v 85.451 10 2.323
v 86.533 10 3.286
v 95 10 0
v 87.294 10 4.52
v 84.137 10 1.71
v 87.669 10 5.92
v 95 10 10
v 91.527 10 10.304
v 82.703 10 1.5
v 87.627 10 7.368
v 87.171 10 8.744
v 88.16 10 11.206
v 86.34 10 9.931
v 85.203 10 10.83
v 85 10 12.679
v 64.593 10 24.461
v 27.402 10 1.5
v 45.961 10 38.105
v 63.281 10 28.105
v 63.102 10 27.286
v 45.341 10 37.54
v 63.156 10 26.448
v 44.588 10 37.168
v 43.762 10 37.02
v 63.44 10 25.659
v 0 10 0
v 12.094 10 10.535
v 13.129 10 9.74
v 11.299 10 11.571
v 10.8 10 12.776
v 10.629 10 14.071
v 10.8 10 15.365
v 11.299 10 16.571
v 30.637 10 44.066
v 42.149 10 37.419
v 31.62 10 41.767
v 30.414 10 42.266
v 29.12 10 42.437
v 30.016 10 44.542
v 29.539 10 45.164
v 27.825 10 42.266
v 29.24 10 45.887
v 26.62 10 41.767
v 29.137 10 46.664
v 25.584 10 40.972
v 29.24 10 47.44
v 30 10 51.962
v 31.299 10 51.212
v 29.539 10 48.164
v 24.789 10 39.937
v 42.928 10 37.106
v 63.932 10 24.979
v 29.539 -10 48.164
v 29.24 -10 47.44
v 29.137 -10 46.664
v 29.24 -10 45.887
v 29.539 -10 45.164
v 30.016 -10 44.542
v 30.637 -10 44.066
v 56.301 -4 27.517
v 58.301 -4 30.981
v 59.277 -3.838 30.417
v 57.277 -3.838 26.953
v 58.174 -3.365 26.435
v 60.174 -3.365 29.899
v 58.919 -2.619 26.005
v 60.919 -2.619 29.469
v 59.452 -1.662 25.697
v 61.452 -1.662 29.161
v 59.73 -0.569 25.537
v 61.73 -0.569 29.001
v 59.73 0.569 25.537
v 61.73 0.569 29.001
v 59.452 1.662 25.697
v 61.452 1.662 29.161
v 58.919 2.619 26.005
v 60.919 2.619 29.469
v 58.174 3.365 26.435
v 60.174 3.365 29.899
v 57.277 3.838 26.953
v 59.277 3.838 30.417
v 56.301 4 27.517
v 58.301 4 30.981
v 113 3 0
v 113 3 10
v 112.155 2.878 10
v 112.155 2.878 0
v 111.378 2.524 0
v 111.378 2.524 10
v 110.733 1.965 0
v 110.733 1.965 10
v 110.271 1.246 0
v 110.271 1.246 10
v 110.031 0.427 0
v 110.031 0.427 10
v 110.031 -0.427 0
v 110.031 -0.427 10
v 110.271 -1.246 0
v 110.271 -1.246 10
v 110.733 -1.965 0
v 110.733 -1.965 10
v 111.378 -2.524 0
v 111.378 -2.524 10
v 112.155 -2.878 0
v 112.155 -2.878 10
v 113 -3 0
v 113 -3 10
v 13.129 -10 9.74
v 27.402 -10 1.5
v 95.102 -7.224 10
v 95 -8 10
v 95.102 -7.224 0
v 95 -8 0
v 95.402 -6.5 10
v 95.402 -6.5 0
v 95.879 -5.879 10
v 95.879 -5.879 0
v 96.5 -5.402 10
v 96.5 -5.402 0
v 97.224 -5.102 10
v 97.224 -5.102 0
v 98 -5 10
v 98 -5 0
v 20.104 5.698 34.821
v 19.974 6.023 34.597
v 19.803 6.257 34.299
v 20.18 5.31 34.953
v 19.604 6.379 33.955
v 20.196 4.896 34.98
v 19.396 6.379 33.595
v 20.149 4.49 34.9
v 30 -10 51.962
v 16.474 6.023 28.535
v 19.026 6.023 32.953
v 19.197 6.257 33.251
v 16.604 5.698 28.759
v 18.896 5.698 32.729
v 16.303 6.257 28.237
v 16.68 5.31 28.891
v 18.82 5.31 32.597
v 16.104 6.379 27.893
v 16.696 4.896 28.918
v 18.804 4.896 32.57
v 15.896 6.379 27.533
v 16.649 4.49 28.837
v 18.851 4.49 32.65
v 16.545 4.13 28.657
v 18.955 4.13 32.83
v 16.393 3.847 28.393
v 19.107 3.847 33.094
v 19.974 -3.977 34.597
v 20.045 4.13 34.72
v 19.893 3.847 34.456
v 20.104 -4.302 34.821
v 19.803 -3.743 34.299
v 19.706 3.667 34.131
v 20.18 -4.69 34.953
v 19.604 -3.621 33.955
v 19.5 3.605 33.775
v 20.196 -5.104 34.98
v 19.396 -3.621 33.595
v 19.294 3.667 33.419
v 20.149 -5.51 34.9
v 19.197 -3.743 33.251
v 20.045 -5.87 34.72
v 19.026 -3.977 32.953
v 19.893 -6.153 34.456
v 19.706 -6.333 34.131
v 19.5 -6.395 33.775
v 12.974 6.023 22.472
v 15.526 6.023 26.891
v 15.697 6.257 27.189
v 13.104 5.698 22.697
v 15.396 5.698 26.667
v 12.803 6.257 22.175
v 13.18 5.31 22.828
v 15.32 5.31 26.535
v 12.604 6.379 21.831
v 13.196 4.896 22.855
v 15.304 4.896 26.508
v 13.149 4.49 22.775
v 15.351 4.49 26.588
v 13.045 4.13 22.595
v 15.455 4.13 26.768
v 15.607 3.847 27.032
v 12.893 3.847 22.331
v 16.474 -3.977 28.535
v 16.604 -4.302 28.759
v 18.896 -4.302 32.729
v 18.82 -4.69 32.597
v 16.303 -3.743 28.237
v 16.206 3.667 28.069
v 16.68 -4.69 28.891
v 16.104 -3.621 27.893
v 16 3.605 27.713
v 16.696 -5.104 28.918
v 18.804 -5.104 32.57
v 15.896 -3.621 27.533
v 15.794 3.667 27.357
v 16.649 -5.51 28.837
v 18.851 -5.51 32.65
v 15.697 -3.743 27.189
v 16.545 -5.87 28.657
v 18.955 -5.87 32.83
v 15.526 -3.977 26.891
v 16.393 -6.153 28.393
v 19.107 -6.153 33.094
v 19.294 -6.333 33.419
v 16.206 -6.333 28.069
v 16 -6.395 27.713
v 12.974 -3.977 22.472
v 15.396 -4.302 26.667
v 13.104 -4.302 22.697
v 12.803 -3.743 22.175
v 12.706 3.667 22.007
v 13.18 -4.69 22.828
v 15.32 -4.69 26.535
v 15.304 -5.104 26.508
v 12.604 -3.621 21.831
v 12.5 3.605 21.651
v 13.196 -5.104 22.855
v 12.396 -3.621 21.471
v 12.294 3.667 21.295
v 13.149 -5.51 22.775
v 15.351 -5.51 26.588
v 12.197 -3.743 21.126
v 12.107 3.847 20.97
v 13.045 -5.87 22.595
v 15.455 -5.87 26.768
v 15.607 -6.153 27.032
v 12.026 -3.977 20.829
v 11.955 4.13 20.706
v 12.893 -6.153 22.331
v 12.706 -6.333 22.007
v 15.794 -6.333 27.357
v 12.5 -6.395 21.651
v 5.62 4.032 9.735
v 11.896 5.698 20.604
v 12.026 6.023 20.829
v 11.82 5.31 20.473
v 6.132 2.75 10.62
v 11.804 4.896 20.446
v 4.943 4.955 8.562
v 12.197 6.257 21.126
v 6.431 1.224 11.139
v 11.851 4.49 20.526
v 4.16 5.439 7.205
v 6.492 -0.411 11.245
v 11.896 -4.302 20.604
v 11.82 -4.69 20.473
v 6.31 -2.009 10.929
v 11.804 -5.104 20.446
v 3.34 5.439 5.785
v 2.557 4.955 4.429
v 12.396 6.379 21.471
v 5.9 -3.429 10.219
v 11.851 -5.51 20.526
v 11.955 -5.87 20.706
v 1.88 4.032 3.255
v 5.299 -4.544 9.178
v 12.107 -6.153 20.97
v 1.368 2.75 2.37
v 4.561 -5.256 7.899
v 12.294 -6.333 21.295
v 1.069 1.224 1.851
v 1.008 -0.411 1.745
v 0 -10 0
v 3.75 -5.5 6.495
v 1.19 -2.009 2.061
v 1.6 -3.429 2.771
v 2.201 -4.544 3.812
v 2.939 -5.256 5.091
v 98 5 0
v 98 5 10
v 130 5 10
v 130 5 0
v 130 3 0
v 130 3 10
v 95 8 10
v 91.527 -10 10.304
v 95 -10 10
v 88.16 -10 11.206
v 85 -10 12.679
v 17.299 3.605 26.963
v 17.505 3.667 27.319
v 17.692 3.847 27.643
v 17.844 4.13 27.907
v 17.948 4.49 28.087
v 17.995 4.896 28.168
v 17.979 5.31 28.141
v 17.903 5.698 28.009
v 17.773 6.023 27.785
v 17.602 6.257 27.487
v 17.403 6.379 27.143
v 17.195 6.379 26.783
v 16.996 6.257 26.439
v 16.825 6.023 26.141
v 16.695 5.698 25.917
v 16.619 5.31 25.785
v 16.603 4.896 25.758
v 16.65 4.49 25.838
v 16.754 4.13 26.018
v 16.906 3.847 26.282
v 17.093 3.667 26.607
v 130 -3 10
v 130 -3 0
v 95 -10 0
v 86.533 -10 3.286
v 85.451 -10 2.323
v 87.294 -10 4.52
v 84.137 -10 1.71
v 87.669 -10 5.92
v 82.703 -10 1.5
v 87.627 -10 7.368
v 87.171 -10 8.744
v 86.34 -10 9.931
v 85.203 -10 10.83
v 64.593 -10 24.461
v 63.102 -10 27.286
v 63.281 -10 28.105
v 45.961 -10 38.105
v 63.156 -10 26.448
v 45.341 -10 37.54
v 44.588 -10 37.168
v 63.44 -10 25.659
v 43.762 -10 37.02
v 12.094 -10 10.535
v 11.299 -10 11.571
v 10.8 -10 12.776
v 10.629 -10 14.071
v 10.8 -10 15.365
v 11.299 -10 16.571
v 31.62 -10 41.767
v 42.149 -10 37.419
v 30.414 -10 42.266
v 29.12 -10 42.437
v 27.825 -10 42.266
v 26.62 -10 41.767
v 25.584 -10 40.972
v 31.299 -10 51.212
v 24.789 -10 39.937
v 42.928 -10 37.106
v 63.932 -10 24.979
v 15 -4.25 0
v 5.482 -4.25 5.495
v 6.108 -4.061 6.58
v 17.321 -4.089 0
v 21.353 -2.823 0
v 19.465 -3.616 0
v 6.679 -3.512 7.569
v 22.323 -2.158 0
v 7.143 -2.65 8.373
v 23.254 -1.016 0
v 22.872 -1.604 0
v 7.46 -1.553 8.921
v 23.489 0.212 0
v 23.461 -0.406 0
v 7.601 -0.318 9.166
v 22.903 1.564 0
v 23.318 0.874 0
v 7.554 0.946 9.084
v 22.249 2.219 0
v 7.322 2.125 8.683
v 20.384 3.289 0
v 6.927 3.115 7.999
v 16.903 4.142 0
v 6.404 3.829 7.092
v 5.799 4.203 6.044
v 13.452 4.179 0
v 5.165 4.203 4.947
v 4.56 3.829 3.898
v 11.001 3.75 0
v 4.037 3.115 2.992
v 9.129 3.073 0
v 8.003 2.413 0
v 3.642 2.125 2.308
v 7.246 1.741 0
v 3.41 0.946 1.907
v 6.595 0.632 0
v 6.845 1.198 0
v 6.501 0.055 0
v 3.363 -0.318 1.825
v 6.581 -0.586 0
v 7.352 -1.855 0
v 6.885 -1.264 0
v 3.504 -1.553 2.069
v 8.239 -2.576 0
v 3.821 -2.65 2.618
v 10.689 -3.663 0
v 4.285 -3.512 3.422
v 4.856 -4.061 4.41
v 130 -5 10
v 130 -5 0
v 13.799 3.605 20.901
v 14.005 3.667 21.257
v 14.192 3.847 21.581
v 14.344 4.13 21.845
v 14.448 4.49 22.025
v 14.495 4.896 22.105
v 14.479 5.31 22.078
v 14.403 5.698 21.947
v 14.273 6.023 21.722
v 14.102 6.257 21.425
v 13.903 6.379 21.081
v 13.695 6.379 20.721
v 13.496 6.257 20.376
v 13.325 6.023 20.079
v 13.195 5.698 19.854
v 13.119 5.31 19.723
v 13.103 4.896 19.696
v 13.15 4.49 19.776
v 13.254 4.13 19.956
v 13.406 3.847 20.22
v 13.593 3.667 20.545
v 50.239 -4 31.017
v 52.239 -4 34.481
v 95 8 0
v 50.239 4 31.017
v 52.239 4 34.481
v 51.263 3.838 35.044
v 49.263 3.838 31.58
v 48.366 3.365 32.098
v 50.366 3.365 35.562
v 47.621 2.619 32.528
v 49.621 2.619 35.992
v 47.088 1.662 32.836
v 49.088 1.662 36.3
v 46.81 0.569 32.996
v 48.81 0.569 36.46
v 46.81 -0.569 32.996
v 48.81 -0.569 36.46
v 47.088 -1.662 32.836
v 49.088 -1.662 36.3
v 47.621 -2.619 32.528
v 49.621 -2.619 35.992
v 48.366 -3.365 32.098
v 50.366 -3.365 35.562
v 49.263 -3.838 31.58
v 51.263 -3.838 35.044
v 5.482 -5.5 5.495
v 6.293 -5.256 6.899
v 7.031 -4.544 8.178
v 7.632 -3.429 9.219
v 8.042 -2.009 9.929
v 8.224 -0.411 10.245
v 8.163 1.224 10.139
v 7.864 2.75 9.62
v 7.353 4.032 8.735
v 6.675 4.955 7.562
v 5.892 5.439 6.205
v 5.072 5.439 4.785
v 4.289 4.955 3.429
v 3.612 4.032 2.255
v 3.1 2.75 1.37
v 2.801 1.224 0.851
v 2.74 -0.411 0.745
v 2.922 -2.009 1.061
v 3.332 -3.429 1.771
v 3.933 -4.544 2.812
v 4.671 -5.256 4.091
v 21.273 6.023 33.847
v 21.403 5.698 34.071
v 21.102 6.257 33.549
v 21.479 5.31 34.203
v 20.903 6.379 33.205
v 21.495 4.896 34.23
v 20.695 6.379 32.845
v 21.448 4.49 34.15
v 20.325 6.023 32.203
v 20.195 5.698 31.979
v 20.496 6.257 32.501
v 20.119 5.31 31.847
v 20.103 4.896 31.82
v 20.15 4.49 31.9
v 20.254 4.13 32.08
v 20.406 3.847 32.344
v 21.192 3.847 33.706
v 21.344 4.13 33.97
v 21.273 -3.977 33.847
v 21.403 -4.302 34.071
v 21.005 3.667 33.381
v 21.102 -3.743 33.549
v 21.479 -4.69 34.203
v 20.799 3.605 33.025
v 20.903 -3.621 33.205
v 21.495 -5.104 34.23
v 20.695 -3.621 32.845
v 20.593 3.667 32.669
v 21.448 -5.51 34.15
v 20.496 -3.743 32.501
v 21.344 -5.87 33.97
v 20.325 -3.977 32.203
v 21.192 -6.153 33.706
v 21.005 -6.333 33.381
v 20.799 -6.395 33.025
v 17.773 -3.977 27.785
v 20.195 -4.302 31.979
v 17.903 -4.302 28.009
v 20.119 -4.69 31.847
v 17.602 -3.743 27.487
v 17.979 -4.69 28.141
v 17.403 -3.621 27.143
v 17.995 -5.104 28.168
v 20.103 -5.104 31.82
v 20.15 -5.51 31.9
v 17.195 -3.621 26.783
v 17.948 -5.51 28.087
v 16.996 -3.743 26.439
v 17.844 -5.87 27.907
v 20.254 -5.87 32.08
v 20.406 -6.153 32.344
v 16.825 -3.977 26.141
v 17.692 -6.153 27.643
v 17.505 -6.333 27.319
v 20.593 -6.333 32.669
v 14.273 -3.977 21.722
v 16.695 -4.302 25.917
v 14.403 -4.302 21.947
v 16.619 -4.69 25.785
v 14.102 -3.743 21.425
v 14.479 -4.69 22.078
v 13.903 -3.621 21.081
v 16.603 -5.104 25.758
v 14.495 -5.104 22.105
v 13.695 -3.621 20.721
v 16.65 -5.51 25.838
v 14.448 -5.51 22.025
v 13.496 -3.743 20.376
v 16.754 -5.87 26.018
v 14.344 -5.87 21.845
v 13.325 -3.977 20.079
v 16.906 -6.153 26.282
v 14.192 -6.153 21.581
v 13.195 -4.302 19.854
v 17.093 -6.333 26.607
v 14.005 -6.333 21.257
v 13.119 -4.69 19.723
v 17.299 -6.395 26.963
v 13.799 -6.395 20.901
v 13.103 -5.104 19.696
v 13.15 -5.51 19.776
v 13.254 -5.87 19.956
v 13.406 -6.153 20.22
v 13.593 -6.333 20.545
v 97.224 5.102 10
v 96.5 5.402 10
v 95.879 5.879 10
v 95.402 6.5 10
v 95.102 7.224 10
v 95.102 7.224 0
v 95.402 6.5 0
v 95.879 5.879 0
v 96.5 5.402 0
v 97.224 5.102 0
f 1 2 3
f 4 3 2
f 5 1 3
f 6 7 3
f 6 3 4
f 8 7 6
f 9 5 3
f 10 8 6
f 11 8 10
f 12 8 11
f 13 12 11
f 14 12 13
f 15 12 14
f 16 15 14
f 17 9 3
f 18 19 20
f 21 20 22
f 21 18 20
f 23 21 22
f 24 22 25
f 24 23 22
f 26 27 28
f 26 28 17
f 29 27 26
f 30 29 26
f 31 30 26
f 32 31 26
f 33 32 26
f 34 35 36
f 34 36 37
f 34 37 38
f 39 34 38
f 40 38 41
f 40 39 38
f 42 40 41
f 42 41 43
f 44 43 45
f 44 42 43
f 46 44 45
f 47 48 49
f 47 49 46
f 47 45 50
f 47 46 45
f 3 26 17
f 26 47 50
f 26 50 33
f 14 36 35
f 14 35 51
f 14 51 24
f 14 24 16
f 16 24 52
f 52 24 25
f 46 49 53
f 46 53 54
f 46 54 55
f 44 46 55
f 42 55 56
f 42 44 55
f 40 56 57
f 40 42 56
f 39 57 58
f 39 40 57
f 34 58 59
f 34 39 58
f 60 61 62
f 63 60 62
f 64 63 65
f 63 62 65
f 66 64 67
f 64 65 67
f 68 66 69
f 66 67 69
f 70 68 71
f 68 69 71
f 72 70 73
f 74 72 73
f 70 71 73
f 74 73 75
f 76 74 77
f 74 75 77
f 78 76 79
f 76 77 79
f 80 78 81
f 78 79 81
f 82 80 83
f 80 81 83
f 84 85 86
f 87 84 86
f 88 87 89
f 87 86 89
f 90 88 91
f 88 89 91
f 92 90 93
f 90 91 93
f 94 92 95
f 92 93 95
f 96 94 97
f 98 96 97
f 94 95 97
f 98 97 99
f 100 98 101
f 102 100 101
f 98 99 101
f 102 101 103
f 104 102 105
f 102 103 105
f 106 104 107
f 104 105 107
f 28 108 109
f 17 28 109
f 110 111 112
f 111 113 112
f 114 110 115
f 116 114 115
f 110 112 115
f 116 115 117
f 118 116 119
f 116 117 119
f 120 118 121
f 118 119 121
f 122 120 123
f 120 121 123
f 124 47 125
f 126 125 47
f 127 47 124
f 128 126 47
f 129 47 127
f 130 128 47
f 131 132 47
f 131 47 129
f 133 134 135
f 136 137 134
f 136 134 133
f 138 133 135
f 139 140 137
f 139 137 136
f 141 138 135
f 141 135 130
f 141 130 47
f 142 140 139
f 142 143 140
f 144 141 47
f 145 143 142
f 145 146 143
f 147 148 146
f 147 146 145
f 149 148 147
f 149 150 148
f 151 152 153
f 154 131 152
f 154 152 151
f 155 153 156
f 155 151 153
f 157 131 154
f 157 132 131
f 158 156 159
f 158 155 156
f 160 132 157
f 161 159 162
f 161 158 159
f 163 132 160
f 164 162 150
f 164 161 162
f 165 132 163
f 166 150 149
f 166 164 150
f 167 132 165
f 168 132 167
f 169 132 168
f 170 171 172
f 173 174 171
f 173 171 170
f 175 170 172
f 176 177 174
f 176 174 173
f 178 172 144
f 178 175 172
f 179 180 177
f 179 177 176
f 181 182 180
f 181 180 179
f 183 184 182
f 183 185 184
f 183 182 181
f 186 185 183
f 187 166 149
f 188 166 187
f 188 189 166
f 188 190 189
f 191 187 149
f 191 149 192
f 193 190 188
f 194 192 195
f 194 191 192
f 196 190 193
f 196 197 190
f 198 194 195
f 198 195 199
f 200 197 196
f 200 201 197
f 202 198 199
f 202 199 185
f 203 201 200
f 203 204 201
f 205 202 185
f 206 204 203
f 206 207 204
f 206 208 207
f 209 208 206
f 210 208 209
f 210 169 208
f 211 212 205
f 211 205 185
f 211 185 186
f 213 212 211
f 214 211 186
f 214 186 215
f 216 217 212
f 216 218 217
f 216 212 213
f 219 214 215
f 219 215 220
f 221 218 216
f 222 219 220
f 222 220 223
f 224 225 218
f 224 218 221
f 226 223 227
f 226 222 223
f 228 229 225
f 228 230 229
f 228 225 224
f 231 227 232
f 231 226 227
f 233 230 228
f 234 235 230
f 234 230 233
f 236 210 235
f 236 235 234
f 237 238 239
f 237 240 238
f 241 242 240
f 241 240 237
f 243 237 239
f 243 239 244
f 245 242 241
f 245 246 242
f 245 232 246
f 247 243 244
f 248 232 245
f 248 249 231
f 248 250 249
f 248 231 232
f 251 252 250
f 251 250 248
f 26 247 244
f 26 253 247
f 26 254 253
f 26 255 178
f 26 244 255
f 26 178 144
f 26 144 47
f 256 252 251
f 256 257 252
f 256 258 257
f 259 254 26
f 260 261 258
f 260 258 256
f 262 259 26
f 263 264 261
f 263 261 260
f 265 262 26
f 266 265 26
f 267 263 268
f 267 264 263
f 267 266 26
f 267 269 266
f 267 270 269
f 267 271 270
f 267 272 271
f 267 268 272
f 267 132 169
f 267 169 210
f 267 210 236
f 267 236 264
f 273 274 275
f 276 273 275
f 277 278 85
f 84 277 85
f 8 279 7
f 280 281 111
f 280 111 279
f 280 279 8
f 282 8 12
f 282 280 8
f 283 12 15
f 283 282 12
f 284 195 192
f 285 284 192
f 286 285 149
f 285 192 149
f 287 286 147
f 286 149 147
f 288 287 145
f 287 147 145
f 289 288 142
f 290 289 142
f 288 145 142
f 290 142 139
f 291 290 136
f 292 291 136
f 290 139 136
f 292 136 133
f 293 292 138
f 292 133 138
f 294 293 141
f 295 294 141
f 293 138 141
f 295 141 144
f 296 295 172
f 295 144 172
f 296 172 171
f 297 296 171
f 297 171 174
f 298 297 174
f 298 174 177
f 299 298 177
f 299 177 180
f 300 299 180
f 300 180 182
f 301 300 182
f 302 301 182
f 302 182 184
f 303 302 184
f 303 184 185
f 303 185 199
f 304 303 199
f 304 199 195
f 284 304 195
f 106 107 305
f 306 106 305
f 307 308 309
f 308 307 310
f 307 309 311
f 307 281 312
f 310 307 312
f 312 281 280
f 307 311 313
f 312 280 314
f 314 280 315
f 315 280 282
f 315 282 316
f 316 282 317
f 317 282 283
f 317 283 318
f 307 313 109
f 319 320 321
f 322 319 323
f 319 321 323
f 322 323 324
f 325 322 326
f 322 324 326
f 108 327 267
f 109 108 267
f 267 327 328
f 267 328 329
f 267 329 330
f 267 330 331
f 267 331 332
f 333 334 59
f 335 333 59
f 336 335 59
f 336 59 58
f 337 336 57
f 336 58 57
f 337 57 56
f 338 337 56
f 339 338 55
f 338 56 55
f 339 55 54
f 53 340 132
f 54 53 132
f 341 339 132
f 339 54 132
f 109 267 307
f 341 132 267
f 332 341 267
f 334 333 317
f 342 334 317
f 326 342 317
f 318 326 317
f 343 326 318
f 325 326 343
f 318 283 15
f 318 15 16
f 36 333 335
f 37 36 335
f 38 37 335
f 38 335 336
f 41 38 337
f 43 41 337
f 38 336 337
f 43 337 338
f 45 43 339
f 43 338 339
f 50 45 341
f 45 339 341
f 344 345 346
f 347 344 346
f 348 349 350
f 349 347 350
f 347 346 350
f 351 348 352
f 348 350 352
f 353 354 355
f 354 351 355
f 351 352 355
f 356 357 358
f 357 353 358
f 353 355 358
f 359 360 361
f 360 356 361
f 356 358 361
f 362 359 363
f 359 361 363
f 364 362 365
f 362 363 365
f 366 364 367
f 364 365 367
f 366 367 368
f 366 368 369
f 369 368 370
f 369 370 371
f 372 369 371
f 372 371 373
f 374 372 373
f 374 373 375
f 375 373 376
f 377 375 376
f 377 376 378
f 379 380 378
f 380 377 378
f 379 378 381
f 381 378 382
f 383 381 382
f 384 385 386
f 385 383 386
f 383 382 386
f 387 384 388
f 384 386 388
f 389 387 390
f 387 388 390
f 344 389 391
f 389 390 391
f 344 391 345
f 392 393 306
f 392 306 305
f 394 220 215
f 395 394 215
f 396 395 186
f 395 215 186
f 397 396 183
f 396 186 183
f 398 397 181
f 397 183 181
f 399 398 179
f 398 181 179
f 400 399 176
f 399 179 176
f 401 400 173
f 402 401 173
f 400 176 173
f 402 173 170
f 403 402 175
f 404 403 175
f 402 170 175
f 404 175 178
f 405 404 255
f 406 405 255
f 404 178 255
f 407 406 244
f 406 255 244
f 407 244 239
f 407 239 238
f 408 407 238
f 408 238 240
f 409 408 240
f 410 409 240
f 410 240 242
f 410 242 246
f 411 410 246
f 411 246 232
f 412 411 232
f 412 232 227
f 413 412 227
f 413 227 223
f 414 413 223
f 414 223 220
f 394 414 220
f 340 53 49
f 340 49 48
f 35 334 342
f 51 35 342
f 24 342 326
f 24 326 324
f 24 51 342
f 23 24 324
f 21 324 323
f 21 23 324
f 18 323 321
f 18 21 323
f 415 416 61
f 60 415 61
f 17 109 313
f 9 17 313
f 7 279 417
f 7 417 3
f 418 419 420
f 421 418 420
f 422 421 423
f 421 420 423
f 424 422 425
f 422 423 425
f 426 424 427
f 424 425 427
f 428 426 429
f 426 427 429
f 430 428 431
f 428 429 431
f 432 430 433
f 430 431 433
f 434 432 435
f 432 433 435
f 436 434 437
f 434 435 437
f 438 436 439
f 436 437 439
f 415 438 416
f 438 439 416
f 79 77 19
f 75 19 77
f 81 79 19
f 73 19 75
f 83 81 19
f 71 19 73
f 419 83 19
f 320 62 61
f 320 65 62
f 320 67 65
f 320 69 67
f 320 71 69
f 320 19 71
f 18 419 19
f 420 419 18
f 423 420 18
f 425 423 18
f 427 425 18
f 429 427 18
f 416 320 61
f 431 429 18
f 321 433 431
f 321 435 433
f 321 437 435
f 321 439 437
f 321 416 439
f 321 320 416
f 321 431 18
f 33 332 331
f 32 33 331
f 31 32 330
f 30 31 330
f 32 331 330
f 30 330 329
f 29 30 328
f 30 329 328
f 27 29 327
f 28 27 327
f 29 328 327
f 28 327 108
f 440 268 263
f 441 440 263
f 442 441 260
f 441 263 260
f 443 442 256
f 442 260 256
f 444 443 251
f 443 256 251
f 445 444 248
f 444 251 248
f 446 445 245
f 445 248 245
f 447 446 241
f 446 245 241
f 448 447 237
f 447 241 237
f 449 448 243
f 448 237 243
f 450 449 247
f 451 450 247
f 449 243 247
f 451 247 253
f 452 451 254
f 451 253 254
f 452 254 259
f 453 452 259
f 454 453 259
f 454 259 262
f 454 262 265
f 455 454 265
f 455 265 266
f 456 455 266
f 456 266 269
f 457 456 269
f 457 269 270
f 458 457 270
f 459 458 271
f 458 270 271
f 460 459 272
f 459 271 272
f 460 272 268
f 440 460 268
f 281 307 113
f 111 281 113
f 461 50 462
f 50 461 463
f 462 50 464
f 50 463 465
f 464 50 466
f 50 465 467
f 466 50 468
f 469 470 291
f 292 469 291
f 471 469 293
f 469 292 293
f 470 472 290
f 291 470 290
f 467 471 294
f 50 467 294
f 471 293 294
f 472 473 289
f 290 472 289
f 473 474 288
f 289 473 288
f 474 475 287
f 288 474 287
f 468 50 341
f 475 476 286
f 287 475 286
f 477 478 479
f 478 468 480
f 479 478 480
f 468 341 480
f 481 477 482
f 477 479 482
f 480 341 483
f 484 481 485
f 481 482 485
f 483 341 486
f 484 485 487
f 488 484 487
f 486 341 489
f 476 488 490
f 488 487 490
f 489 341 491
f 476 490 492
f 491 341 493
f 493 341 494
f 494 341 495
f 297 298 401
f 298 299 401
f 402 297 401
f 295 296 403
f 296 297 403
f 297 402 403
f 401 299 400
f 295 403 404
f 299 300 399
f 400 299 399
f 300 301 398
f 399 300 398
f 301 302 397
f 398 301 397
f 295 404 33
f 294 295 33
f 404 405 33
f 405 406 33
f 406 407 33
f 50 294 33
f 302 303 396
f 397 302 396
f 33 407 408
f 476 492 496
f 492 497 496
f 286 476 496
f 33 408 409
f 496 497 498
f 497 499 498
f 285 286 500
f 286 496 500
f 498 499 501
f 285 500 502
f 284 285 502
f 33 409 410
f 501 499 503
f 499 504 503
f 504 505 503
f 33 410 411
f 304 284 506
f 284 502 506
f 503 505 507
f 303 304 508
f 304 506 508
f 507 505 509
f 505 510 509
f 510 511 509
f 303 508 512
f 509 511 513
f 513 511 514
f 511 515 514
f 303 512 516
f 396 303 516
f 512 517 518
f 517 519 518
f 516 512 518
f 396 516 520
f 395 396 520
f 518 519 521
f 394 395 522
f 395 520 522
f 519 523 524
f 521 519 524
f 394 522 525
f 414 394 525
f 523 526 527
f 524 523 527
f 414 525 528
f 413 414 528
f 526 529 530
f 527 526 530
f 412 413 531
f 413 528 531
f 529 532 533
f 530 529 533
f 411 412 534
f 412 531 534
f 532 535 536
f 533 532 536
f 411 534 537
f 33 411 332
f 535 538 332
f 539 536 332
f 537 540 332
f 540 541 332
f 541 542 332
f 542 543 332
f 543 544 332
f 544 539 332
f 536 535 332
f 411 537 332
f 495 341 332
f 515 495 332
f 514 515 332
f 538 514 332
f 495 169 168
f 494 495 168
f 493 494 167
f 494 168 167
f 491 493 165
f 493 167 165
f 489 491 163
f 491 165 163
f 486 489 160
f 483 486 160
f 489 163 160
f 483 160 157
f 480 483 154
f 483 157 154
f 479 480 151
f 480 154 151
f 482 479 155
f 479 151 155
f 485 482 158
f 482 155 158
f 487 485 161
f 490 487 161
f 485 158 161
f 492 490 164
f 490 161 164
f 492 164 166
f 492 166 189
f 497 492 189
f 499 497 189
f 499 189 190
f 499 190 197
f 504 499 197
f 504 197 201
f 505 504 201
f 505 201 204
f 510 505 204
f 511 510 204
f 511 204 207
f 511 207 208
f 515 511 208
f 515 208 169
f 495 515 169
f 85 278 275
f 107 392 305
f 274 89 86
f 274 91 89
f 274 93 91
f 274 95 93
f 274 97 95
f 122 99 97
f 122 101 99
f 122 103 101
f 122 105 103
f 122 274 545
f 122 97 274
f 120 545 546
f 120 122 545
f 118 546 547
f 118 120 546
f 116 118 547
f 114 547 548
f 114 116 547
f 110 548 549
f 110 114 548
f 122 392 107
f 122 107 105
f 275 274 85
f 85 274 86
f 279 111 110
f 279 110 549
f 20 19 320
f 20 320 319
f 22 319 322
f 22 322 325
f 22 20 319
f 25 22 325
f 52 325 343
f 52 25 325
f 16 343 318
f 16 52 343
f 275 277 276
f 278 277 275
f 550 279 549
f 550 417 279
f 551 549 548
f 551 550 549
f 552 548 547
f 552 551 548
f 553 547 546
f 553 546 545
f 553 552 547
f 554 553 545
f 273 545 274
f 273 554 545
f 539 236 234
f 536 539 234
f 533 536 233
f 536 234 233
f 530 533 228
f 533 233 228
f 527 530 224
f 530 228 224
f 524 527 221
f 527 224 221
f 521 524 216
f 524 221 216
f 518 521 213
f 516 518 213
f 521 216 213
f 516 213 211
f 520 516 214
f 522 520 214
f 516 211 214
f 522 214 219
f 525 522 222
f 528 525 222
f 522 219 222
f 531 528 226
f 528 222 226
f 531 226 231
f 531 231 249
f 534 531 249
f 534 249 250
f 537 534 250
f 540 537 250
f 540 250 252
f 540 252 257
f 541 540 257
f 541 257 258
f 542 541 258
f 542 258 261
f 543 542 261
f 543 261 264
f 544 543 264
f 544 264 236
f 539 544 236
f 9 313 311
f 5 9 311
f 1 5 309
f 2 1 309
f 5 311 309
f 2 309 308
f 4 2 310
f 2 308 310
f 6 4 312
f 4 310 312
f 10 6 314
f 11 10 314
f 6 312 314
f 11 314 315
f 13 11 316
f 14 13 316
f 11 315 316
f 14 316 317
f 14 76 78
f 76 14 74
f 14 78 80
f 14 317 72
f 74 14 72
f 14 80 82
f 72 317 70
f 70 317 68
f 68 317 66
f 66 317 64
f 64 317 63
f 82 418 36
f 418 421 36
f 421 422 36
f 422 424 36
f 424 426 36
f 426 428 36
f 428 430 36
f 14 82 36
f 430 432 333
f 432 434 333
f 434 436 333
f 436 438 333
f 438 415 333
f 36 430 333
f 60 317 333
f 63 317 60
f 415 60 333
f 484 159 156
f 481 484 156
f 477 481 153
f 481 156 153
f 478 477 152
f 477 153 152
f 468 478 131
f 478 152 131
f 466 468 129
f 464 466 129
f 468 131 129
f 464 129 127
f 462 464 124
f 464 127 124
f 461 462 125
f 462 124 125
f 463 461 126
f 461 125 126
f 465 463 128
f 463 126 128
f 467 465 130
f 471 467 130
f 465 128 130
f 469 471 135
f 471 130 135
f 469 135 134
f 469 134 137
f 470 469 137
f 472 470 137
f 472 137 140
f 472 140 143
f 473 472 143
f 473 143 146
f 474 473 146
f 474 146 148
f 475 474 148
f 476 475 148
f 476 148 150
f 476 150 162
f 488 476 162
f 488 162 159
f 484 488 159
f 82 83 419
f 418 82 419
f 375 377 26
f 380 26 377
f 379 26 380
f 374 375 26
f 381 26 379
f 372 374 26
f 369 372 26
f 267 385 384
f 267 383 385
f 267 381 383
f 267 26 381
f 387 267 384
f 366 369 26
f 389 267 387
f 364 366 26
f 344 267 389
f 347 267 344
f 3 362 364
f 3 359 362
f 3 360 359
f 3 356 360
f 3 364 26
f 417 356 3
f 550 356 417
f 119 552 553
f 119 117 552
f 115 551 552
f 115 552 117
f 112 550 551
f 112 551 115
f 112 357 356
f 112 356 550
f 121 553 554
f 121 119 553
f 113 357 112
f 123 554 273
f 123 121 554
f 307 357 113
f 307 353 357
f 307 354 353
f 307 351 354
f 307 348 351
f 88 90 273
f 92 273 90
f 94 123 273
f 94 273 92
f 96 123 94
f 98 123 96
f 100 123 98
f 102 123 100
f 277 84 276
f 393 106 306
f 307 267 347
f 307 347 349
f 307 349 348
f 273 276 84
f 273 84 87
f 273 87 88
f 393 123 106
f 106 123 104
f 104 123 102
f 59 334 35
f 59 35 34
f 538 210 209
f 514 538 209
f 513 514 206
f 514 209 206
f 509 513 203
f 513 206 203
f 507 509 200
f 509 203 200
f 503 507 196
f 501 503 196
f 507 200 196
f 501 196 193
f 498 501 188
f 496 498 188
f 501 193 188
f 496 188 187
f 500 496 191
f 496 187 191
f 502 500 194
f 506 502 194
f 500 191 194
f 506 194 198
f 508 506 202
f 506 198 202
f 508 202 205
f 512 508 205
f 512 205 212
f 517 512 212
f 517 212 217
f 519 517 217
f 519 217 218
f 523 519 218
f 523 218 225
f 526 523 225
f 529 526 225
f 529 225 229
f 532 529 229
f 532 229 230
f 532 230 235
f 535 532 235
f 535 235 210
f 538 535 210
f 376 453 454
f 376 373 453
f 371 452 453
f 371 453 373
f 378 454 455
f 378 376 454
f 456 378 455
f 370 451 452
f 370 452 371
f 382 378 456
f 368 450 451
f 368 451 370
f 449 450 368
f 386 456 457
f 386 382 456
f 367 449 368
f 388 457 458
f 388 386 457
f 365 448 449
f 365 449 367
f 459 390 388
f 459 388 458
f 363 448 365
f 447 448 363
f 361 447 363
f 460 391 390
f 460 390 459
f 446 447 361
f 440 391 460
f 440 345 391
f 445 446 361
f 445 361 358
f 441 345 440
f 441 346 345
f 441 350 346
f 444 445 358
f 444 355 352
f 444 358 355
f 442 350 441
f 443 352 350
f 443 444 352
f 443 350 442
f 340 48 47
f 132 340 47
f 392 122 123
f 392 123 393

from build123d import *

# Parameters (mm, degrees)
F1_DEPTH    = 10
F2_T1_DEPTH = 20
F4_DEPTH    = 20.001
F5_W        = 35
F5_H        = 5
F6_DEPTH    = 10.001
F7_R        = 3
F9_DEPTH    = 10.001
F11_DEPTH   = 4
F12_R       = 5.5
F13_DEPTH   = 2
F14_R       = 4.25
F15_DEPTH   = 112.584302492
F16_R       = 1.395
F17_DEPTH   = 25


# Not quite as in the source:
# - a fillet or chamfer that OpenCascade refuses, or shapes differently, is made with other operations: its cross-section is extruded or revolved along the edge and cut away or added


with BuildPart() as f1:
    # F0 (on Front) → F1 (new body, symmetric)
    with BuildSketch(Plane.XZ):
        with BuildLine():
            Line((30, 51.9615242271), (0, 0))
            Line((0, 0), (130, 0))
            Line((130, 0), (130, 10))
            Line((130, 10), (95, 10))
            ThreePointArc((95, 10), (89.8236190979, 10.6814834742), (85, 12.6794919243))
            Line((85, 12.6794919243), (62.0314784198, 25.9403740415))
            Line((62.0314784198, 25.9403740415), (63.2814784198, 28.105437551))
            Line((63.2814784198, 28.105437551), (45.9609703441, 38.105437551))
            Line((45.9609703441, 38.105437551), (44.7109703441, 35.9403740415))
            Line((44.7109703441, 35.9403740415), (28.0394191624, 45.5656986041))
            Line((28.0394191624, 45.5656986041), (31.2990381057, 51.2115242271))
            Line((31.2990381057, 51.2115242271), (30, 51.9615242271))
        make_face()
    extrude(amount=F1_DEPTH, both=True)

    # F2: fillet of radius 3 on 3 edges, made by hand

    # F2_s2 → F2_t1 (join)
    with BuildSketch(Plane.XZ.offset(-10)):
        with BuildLine():
            ThreePointArc((63.2814784198, 28.105437551), (63.2705212044, 26.0433626604), (64.5932161113, 24.4613540958))
            Line((64.5932161113, 24.4613540958), (62.0314784198, 25.9403740415))
            Line((62.0314784198, 25.9403740415), (63.2814784198, 28.105437551))
        make_face()
        with BuildLine():
            ThreePointArc((42.1492326526, 37.4193939873), (44.180639712, 37.0649108788), (45.9609703441, 38.105437551))
            Line((45.9609703441, 38.105437551), (44.7109703441, 35.9403740415))
            Line((44.7109703441, 35.9403740415), (42.1492326526, 37.4193939873))
        make_face()
        with BuildLine():
            ThreePointArc((29.5394191624, 48.1637748154), (29.2397178949, 45.8873176801), (30.6374953738, 44.0656986041))
            Line((30.6374953738, 44.0656986041), (28.0394191624, 45.5656986041))
            Line((28.0394191624, 45.5656986041), (29.5394191624, 48.1637748154))
        make_face()
    extrude(amount=F2_T1_DEPTH)

    # F3 (on face) → F4 (cut, through all)
    with BuildSketch(Plane.XZ.offset(10)):
        with BuildLine():
            ThreePointArc((82.7031939779, 1.5), (87.5328231093, 5.2059047745), (85.2031939779, 10.8301270189))
            Line((85.2031939779, 10.8301270189), (31.6195461814, 41.7666604984))
            ThreePointArc((31.6195461814, 41.7666604984), (27.8254509559, 42.2661626109), (24.7894191624, 39.9365334795))
            Line((24.7894191624, 39.9365334795), (11.2990381057, 16.5705080757))
            ThreePointArc((11.2990381057, 16.5705080757), (10.7995359932, 12.7764128502), (13.1291651246, 9.7403810568))
            Line((13.1291651246, 9.7403810568), (27.4019237886, 1.5))
            Line((27.4019237886, 1.5), (82.7031939779, 1.5))
        make_face()
    extrude(amount=-F4_DEPTH, mode=Mode.SUBTRACT)

    # F5 (on face) → F6 (cut, through all)
    with BuildSketch(Plane.XY.offset(10)):
        with Locations((112.5, 7.5)):
            Rectangle(F5_W, F5_H)
        with Locations((112.5, -7.5)):
            Rectangle(F5_W, F5_H)
    extrude(amount=-F6_DEPTH, mode=Mode.SUBTRACT)

    # F7
    f7_edges = [f1.edges().sort_by_distance(p)[0] for p in [
        (95, -5, 5),
        (95, 5, 5),
    ]]
    fillet(f7_edges, radius=F7_R)

    # F8 (on face) → F9 (cut, through all)
    with BuildSketch(Plane.XY.offset(10)):
        with BuildLine():
            Line((130, -3), (130, 3))
            Line((130, 3), (113, 3))
            ThreePointArc((113, 3), (110, 0), (113, -3))
            Line((113, -3), (130, -3))
        make_face()
    extrude(amount=-F9_DEPTH, mode=Mode.SUBTRACT)

    # F10 (on face) → F11 (cut)
    with BuildSketch(Plane(origin=(27.9903810568, 0, 48.4807621135), x_dir=(0.8660254038, 0, -0.5), z_dir=(0.5, 0, 0.8660254038))):
        with BuildLine():
            Line((35, 4), (28, 4))
            ThreePointArc((28, 4), (24, 0), (28, -4))
            Line((28, -4), (35, -4))
            ThreePointArc((35, -4), (39, 0), (35, 4))
        make_face()
    extrude(amount=-F11_DEPTH, mode=Mode.SUBTRACT)

    # F12 (on face) → F13 (cut)
    with BuildSketch(Plane(origin=(0, 0, 0), x_dir=(0, -1, 0), z_dir=(-0.8660254038, 0, 0.5))):
        with Locations((0, 7.5)):
            Circle(F12_R)
    extrude(amount=-F13_DEPTH, mode=Mode.SUBTRACT)

    # F14 (on face) → F15 (cut, through all)
    with BuildSketch(Plane(origin=(0, 0, 0), x_dir=(0, -1, 0), z_dir=(-0.8660254038, 0, 0.5))):
        with Locations((0, 7.5)):
            Circle(F14_R)
    extrude(amount=-F15_DEPTH, mode=Mode.SUBTRACT)

    # F16 (on face) → F17 (cut)
    with BuildSketch(Plane(origin=(0, 0, 0), x_dir=(0, -1, 0), z_dir=(-0.8660254038, 0, 0.5))):
        with Locations((-5, 25)):
            Circle(F16_R)
        with Locations((-5, 32)):
            Circle(F16_R)
        with Locations((-5, 39)):
            Circle(F16_R)
        with Locations((5, 39)):
            Circle(F16_R)
        with Locations((5, 32)):
            Circle(F16_R)
        with Locations((5, 25)):
            Circle(F16_R)
    extrude(amount=-F17_DEPTH, mode=Mode.SUBTRACT)


solid = f1.part
